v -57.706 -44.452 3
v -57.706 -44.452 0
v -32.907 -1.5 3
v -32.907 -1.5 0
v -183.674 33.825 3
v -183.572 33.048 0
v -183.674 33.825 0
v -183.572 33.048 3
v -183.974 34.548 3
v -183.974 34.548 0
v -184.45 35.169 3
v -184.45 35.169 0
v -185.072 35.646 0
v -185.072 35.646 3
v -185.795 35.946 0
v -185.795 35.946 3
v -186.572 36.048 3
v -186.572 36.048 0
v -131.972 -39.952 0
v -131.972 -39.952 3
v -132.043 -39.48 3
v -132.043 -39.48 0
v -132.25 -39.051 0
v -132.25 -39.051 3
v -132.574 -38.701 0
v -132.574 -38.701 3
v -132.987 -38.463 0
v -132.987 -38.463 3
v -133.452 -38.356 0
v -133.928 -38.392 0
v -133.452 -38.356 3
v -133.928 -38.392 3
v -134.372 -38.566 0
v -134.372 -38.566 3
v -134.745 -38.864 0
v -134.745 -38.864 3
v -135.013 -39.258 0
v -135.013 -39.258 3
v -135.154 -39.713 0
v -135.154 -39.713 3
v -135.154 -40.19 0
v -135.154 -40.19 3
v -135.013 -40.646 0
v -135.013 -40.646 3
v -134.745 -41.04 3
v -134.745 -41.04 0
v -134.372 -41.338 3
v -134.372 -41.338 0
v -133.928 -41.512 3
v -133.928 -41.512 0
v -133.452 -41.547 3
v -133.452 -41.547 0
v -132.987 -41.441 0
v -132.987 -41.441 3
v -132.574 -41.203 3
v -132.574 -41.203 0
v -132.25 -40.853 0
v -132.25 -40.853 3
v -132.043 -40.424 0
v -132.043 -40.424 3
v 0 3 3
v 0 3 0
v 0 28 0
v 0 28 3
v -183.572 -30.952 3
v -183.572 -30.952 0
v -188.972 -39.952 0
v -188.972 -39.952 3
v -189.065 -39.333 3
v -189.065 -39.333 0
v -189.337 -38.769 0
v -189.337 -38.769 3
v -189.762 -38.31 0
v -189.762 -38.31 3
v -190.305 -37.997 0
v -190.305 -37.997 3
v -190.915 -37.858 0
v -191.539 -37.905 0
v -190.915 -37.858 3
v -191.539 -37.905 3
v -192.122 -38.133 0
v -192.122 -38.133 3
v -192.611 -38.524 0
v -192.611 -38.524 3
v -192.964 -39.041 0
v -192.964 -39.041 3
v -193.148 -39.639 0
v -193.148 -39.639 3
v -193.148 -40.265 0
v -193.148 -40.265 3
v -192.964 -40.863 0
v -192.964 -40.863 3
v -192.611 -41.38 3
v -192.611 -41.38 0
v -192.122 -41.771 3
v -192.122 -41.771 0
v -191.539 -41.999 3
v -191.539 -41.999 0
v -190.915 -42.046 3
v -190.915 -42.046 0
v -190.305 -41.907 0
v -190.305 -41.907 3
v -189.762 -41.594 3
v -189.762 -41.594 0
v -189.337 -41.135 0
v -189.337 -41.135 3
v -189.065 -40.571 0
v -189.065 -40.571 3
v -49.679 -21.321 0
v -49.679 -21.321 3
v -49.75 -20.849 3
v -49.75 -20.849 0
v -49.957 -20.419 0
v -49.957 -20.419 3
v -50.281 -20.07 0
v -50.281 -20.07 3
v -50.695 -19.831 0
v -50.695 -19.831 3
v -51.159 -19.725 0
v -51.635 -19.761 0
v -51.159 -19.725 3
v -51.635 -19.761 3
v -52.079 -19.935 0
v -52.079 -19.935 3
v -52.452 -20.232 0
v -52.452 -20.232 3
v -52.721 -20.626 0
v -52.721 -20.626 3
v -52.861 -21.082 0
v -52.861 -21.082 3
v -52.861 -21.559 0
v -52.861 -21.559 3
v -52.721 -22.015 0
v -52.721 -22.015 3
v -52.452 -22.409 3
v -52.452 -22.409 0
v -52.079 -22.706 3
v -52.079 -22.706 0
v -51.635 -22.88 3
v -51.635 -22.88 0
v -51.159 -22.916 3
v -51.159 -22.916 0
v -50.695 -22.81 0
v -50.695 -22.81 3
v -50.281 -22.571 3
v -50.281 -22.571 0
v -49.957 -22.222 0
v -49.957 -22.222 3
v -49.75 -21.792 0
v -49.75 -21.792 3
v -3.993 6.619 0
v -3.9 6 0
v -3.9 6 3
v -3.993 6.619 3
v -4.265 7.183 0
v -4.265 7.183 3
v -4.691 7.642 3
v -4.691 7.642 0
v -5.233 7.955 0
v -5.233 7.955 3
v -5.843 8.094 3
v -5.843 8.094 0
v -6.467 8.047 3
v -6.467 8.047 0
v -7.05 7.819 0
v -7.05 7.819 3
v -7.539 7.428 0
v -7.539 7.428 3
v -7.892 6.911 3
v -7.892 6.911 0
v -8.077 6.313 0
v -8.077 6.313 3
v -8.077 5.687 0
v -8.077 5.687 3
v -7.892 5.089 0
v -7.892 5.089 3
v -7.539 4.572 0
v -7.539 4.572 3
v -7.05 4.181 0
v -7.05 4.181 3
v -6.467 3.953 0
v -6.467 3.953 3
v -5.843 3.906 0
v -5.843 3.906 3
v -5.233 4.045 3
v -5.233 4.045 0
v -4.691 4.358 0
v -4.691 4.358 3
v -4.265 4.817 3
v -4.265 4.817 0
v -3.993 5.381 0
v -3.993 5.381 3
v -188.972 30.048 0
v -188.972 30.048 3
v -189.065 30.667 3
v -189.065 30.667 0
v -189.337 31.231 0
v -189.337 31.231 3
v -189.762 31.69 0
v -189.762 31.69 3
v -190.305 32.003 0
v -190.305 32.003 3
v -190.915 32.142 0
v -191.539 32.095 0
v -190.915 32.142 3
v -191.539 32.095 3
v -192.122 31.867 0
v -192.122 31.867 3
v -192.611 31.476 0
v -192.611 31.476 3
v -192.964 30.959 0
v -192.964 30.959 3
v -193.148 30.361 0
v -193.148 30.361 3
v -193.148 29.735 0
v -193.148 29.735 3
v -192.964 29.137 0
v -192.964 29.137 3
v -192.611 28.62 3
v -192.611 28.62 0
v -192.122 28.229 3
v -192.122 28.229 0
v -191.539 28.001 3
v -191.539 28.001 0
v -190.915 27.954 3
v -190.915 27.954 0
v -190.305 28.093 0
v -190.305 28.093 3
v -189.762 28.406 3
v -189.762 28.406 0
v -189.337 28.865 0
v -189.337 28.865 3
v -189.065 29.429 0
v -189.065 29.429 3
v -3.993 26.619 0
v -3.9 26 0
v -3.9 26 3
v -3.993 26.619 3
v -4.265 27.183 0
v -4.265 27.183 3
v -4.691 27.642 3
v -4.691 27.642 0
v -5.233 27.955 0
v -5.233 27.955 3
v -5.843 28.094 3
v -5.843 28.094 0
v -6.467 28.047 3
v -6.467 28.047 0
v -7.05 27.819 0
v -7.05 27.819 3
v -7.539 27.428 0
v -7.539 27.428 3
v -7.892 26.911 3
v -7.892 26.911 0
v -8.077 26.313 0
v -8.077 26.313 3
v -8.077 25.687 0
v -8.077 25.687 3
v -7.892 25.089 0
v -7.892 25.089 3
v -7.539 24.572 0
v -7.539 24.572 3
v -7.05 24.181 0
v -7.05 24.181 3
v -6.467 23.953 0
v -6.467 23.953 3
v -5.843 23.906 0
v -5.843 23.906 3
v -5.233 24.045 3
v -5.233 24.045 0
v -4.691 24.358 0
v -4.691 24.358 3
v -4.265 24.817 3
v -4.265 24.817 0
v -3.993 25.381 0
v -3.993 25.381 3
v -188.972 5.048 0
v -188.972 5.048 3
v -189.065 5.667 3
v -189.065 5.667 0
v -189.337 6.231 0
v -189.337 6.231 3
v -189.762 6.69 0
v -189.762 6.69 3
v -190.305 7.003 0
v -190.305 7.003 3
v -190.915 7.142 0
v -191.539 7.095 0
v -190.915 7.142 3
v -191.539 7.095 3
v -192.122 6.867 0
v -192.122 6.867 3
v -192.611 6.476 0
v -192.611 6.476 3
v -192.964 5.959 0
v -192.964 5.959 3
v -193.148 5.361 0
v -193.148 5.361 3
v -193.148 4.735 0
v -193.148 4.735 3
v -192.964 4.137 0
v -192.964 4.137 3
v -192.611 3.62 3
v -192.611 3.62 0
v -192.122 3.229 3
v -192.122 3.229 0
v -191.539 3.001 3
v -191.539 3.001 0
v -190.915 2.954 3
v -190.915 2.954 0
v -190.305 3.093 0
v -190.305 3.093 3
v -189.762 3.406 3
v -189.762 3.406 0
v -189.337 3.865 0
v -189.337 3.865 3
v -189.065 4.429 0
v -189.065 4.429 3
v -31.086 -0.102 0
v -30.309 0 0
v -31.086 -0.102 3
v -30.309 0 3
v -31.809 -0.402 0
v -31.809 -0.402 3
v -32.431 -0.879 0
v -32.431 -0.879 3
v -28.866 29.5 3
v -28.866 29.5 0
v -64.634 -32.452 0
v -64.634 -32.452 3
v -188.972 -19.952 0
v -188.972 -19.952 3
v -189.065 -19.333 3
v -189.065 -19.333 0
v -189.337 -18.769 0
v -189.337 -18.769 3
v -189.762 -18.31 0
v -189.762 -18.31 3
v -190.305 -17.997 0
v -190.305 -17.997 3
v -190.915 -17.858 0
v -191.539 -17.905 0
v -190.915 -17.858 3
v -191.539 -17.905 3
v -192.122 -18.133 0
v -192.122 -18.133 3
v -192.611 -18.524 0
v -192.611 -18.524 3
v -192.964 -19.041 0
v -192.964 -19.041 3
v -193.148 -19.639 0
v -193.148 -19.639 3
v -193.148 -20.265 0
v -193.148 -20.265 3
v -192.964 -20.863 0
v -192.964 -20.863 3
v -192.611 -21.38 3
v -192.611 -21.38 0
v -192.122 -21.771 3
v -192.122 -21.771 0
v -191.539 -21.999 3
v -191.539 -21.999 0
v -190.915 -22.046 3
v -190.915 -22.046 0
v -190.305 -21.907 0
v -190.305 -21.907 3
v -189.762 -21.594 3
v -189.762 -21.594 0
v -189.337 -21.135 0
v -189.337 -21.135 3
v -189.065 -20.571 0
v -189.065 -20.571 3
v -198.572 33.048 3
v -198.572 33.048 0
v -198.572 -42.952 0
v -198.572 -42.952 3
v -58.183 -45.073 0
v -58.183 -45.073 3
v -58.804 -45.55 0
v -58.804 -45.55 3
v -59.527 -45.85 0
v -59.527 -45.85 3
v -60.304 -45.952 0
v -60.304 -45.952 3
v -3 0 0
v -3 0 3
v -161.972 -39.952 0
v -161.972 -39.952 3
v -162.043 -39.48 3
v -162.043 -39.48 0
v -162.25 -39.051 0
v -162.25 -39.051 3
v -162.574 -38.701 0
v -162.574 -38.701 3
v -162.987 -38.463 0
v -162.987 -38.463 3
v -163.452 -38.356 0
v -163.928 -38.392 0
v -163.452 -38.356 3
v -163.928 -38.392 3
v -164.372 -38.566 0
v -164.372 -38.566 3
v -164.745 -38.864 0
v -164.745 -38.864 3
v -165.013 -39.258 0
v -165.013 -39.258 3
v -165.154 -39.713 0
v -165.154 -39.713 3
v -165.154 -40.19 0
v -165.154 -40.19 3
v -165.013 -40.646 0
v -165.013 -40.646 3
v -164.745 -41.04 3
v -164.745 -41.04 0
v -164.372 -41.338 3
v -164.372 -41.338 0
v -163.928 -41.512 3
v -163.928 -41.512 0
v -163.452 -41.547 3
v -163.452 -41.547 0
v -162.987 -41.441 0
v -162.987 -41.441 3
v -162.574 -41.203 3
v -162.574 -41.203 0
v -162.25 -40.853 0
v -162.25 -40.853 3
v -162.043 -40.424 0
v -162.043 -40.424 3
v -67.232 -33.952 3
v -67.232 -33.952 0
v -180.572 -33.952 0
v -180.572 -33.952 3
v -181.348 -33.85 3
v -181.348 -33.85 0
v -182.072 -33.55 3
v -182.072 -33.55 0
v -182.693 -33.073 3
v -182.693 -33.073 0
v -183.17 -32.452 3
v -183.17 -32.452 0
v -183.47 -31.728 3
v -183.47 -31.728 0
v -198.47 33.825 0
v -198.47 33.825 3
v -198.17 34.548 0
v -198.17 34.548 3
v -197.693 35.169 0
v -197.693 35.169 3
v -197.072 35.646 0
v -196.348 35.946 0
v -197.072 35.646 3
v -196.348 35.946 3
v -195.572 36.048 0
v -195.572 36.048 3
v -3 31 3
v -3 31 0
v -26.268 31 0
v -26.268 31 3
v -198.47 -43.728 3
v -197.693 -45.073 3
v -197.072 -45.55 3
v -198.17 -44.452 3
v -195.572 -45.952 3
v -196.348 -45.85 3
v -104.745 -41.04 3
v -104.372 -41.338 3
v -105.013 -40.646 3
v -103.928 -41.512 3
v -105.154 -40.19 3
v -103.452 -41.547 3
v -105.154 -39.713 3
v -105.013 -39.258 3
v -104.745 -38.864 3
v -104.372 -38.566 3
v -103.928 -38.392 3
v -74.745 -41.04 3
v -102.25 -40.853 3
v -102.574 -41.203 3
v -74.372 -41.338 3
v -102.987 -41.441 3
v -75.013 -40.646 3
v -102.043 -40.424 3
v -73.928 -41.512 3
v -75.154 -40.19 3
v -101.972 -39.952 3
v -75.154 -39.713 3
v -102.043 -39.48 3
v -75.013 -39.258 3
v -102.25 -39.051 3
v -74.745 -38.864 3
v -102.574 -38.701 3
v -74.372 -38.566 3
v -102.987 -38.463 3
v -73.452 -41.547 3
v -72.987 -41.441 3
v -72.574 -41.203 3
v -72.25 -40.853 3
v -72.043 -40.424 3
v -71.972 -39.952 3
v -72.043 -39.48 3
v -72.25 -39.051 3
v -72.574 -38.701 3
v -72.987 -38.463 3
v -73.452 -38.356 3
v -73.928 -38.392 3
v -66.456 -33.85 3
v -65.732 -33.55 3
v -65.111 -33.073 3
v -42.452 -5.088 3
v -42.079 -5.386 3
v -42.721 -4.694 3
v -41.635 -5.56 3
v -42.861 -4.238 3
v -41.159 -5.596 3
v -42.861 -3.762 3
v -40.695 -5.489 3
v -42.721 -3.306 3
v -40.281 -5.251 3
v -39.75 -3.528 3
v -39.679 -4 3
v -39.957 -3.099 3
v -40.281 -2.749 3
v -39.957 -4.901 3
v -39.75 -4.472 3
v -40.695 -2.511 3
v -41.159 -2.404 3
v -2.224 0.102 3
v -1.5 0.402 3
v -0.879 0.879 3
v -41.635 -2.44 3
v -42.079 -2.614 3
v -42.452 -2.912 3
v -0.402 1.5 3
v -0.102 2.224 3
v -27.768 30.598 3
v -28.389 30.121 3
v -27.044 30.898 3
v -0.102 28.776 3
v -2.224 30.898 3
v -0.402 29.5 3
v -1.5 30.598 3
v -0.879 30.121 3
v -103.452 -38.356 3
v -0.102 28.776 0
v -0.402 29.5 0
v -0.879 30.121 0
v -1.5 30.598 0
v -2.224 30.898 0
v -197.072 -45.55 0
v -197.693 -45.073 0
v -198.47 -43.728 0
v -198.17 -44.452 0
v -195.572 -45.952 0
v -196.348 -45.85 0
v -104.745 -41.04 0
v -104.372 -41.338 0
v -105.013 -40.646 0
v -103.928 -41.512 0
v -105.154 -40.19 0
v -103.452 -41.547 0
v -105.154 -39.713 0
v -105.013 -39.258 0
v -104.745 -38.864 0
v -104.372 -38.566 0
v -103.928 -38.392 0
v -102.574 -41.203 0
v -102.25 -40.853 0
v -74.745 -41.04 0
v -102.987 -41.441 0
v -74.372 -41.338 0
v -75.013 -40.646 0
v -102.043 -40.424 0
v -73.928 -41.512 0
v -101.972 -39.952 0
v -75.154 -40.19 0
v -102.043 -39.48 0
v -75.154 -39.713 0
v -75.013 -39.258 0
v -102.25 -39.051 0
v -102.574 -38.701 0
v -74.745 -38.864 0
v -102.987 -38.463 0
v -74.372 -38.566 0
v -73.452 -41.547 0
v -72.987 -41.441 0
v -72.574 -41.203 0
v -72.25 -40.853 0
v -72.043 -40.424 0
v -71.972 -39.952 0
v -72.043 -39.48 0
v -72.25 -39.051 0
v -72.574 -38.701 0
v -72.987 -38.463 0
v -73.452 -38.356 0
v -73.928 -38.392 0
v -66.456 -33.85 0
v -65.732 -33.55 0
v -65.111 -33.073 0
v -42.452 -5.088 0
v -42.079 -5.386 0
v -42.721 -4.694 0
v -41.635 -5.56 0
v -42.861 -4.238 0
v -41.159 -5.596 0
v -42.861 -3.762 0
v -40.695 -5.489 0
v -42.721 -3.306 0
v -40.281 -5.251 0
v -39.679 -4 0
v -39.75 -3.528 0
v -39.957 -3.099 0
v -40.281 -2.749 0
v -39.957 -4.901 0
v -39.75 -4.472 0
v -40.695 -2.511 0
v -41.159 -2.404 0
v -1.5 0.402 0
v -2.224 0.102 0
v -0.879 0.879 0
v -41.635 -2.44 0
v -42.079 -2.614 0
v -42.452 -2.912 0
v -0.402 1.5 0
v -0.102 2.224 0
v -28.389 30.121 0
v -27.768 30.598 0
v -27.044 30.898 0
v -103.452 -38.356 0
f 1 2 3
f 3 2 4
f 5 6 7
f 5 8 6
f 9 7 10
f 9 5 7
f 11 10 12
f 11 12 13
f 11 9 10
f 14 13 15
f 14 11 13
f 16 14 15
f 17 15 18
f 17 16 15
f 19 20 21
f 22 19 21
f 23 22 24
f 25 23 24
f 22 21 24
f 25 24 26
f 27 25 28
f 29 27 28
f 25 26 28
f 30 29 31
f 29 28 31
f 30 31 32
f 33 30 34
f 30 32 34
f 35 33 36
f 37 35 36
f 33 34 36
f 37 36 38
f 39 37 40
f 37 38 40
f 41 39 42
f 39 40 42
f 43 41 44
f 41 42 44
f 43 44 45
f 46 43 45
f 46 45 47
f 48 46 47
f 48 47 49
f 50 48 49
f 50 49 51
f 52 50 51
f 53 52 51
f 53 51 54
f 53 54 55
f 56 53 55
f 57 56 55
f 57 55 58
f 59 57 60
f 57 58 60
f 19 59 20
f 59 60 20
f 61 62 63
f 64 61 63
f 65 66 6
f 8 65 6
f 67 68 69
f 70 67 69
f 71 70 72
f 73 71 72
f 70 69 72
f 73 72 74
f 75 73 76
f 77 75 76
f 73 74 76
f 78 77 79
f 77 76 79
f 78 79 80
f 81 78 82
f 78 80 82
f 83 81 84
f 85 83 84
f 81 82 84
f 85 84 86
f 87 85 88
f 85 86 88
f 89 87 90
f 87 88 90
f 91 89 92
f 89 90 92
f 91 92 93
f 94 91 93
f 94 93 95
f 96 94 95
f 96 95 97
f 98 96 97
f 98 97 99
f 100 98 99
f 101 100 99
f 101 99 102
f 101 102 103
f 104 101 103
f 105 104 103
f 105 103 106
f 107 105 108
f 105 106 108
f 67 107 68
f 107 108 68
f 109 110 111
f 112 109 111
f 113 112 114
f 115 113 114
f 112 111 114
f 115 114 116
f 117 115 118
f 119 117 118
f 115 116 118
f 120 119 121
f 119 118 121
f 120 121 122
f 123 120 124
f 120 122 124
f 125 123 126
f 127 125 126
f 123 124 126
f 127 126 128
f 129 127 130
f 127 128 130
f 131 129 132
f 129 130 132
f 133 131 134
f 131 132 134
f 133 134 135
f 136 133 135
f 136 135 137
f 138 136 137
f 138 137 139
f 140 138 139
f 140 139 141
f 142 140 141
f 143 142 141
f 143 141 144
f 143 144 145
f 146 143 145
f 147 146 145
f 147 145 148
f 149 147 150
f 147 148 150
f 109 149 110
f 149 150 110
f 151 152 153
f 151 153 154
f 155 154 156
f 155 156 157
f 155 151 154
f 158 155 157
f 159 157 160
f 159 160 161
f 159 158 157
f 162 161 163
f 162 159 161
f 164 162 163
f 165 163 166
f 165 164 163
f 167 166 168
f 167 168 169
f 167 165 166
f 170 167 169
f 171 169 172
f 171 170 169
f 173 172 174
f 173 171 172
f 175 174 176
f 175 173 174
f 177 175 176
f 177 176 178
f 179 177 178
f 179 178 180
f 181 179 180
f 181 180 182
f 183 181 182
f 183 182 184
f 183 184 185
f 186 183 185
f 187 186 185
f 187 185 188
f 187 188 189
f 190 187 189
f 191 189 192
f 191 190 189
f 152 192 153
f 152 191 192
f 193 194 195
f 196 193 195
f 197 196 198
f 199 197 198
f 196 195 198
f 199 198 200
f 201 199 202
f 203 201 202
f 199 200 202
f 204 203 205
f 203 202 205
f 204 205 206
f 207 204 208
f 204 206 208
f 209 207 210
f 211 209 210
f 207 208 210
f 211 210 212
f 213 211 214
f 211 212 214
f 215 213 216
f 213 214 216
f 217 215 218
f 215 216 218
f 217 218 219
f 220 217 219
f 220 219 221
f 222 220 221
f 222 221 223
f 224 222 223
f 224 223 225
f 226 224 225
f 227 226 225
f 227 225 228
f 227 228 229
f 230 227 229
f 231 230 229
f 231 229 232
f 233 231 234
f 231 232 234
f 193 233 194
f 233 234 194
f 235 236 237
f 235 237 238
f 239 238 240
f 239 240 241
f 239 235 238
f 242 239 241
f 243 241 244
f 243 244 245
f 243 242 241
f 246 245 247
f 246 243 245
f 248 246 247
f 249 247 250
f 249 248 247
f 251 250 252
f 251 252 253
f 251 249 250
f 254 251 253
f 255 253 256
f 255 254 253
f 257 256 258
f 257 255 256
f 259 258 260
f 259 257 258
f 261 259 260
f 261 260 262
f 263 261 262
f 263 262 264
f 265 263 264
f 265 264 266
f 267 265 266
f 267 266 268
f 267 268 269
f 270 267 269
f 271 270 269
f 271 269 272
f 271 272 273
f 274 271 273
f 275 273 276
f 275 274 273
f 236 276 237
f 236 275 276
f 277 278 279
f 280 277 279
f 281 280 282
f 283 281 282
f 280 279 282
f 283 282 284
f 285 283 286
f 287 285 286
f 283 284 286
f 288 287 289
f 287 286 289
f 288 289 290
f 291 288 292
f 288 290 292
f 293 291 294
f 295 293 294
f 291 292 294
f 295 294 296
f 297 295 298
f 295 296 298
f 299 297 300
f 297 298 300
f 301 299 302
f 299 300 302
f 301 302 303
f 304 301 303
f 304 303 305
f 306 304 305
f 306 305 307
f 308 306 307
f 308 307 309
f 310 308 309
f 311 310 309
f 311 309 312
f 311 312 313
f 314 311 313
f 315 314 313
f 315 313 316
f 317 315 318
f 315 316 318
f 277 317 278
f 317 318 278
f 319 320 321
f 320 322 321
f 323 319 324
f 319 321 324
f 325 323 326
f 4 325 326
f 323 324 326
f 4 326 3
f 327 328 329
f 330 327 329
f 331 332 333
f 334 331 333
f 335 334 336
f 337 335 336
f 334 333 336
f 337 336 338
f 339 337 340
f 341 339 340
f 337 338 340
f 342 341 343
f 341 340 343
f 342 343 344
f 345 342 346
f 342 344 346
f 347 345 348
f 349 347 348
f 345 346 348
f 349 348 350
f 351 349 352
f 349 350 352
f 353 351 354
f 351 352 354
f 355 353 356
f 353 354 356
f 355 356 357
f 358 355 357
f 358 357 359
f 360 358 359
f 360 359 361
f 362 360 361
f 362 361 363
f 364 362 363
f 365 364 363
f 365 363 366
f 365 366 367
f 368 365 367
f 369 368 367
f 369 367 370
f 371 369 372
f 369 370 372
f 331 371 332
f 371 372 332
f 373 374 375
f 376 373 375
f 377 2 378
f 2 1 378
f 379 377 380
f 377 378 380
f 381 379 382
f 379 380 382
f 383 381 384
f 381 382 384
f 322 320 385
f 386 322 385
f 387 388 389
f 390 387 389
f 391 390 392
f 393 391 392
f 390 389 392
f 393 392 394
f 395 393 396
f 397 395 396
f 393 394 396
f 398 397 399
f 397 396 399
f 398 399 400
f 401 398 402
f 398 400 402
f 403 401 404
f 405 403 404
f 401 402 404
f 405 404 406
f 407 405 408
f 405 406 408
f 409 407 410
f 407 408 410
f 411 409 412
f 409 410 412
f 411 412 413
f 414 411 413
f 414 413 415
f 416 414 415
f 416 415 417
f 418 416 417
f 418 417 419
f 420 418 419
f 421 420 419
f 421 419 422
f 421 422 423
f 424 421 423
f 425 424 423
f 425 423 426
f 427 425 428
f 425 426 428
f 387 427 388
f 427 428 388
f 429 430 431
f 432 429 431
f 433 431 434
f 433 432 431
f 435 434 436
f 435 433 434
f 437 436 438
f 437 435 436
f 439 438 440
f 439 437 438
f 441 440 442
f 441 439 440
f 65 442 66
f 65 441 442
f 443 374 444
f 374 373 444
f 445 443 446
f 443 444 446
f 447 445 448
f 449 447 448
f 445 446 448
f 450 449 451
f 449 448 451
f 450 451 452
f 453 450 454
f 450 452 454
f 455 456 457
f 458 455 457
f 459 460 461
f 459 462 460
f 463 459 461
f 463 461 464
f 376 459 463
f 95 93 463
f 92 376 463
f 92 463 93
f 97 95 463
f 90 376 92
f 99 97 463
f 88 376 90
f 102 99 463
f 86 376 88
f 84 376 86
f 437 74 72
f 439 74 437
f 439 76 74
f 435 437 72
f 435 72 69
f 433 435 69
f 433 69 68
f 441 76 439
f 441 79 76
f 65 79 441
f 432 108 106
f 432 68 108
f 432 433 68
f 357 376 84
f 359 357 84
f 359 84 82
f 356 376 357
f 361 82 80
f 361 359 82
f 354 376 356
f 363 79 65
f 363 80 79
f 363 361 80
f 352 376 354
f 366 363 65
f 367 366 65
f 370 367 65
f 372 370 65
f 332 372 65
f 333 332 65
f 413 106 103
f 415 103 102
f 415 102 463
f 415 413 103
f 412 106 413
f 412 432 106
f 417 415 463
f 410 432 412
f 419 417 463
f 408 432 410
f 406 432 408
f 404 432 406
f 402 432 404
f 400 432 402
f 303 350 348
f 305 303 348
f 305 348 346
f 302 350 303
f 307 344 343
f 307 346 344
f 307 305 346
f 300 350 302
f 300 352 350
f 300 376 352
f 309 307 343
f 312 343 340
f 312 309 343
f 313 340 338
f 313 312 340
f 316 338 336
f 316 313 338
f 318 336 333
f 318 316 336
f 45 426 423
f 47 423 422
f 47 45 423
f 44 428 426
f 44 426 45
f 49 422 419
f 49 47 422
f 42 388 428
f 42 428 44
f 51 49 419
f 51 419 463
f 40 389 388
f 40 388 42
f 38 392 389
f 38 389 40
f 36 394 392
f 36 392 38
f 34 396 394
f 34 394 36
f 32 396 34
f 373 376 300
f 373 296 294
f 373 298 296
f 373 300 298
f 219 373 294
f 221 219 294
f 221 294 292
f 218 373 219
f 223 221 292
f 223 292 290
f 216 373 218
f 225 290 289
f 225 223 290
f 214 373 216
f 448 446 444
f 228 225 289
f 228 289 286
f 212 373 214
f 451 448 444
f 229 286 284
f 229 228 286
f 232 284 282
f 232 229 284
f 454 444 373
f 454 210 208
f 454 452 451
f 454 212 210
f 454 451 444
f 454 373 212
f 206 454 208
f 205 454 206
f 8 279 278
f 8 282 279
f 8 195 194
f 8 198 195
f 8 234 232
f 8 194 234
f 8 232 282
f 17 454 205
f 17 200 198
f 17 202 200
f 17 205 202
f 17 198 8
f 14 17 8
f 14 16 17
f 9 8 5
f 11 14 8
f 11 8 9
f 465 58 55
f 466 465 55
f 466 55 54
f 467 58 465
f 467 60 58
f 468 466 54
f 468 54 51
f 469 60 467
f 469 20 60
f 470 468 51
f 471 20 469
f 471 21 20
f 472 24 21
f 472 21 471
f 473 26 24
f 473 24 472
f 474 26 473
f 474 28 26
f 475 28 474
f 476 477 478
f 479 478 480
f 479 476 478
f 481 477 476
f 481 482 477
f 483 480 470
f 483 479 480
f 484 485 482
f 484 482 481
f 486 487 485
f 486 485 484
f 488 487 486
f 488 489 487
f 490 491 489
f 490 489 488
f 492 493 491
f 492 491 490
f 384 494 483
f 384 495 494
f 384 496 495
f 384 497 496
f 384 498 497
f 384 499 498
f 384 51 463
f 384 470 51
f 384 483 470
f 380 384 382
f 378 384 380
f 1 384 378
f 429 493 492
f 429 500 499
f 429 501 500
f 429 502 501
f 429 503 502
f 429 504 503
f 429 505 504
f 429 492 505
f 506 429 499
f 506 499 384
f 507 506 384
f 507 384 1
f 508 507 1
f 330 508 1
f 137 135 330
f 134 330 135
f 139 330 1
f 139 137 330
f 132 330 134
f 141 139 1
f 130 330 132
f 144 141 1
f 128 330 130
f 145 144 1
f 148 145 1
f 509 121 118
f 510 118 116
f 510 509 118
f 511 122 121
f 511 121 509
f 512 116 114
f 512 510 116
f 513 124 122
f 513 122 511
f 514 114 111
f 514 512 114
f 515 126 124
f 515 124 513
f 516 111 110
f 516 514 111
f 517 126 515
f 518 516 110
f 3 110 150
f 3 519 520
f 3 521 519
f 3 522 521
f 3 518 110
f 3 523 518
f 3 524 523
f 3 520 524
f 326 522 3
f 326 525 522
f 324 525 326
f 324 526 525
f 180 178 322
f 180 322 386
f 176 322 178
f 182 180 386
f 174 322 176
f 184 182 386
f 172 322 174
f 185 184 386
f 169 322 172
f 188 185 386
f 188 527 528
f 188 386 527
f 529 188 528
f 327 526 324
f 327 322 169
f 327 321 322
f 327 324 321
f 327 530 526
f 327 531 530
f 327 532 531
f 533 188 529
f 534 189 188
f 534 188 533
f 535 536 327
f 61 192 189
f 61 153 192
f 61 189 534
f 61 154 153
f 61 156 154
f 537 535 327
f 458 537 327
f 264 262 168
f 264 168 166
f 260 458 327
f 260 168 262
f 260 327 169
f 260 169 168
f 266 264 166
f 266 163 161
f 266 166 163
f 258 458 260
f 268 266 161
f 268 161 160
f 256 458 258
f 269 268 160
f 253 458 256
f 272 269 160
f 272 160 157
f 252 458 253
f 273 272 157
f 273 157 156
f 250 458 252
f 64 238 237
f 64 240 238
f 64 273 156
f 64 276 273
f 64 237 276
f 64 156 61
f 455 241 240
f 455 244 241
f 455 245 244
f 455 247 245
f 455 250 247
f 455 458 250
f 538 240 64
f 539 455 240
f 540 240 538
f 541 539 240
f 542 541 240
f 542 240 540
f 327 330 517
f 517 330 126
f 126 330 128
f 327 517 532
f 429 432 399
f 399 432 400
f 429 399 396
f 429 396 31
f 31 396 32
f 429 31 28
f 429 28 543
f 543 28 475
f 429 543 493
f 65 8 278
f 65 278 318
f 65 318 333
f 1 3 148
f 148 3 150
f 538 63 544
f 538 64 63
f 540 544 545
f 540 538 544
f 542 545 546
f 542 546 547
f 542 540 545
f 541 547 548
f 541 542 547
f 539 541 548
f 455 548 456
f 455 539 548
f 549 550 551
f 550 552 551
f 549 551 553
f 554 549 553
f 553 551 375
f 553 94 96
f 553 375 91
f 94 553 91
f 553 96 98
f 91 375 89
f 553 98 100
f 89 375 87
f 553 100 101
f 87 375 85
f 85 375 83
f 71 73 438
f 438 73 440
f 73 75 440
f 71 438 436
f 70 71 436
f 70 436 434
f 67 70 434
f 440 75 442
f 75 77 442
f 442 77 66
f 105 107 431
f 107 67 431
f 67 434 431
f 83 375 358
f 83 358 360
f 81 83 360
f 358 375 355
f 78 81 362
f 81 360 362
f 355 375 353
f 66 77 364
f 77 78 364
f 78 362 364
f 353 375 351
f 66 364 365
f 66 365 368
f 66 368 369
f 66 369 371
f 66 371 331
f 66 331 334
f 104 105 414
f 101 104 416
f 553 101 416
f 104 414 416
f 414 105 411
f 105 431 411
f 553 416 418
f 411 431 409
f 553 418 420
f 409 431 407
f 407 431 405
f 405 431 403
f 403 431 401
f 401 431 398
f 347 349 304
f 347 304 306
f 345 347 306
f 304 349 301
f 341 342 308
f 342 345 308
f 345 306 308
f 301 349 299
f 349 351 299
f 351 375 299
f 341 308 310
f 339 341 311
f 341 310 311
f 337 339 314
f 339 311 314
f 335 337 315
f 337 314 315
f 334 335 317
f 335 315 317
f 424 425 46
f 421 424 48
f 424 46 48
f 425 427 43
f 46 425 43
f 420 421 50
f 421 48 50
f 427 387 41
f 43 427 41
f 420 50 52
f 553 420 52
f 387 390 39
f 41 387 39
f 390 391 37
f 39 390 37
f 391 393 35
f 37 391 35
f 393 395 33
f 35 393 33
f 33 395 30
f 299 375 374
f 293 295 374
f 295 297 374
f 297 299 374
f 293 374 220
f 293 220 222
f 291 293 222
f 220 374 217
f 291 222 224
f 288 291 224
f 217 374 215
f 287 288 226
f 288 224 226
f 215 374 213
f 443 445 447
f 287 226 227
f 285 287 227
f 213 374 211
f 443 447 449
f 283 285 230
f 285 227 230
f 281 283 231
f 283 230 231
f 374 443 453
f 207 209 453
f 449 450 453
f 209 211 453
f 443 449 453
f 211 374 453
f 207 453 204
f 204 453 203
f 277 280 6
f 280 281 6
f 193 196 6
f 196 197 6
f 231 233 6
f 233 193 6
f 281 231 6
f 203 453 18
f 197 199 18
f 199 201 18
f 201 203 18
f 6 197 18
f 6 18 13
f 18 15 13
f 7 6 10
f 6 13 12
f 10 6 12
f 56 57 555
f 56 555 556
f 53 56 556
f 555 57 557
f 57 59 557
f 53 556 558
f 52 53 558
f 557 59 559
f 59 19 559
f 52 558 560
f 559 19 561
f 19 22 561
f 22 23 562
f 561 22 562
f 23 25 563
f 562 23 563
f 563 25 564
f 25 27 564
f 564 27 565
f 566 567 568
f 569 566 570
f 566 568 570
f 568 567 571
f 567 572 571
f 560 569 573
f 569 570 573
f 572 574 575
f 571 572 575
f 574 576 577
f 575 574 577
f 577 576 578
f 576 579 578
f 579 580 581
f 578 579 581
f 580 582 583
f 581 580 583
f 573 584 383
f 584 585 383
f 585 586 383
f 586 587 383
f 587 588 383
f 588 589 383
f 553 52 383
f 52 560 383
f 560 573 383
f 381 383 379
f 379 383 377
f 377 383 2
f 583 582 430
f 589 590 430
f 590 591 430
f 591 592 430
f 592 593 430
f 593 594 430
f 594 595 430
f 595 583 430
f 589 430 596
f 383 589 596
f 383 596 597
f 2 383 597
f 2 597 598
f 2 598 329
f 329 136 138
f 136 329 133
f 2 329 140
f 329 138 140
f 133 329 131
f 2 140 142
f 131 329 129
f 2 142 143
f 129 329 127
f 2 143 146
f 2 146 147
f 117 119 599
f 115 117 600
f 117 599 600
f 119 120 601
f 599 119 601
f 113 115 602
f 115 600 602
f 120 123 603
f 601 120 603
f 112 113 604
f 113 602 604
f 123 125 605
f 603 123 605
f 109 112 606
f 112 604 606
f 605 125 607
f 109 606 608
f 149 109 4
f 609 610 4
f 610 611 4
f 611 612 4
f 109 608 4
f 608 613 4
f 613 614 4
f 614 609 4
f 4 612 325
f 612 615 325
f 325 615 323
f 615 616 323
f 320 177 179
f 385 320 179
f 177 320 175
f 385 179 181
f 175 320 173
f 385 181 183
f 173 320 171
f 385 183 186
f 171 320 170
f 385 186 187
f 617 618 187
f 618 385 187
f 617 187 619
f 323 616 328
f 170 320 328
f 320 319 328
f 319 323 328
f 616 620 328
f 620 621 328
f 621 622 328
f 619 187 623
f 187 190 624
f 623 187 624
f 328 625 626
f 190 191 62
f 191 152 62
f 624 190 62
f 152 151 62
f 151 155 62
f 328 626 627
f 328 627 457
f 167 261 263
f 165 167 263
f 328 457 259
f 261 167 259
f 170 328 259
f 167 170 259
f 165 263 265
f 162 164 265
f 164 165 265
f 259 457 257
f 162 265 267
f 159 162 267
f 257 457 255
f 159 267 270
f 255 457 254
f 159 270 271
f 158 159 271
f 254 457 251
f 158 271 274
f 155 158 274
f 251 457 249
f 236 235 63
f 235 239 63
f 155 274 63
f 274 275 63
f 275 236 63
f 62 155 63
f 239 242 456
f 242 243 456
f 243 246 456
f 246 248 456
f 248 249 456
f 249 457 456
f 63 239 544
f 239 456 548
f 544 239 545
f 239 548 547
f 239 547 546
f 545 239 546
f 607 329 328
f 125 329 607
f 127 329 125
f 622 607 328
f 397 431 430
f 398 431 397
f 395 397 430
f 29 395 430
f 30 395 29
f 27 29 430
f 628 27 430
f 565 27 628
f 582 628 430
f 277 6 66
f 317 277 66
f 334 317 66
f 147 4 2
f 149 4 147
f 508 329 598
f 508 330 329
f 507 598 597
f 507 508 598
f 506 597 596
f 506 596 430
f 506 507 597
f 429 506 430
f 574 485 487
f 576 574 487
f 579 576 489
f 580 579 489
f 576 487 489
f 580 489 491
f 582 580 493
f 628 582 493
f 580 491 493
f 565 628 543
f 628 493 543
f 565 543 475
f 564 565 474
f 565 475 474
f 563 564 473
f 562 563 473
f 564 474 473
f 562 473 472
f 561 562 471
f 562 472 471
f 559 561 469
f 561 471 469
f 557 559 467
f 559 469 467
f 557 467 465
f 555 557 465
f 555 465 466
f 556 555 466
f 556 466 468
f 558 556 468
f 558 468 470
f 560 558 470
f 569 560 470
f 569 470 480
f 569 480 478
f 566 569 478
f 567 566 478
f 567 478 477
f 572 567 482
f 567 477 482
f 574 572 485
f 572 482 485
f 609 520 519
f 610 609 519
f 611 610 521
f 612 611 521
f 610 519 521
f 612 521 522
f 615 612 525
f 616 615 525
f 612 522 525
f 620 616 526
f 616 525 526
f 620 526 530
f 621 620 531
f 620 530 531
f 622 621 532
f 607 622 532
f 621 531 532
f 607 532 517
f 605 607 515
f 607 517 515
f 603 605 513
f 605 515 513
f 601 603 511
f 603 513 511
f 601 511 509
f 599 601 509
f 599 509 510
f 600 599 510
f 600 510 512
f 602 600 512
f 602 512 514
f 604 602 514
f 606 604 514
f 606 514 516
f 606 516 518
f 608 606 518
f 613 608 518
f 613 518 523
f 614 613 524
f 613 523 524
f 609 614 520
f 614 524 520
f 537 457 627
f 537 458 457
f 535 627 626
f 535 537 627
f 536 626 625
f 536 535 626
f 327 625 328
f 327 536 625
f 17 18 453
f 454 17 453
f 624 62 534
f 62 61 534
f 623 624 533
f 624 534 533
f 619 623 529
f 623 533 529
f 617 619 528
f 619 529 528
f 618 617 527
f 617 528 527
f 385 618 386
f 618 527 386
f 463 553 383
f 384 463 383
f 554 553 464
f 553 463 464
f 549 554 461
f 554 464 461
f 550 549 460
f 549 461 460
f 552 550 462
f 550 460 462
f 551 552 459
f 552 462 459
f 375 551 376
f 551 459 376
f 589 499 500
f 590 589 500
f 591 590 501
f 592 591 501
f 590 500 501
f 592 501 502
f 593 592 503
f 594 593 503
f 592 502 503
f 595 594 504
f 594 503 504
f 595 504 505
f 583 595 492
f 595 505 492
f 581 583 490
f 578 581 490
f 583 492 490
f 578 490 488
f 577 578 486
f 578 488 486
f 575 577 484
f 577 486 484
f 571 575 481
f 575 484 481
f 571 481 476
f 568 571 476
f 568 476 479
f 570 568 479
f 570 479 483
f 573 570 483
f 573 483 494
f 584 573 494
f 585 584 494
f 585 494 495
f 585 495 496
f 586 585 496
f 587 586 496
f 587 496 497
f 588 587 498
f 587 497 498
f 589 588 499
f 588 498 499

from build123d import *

# Parameters (mm, degrees)
SKETCH_1_R          = 2.1
EXTRUDE_1_DEPTH     = 3
FILLET_2_R          = 3
SKETCH_3_R          = 1.6
SKETCH_3_R_2        = 2.1
CUT_EXTRUDE_2_DEPTH = 3


with BuildPart() as part:
    # 草图1 → 凸台-拉伸1 (new body)
    with BuildSketch(Plane.XY):
        Polygon((0, 0), (0, 31), (-28, 31), (-65.5, -33.951905284), (-183.57179677, -33.951905284), (-183.57179677, 36.048094716), (-198.57179677, 36.048094716), (-198.57179677, -45.951905284), (-58.57179677, -45.951905284), (-32.041451884, 0), align=None)
        with Locations((-6, 26)):
            Circle(SKETCH_1_R, mode=Mode.SUBTRACT)
        with Locations((-6, 6)):
            Circle(SKETCH_1_R, mode=Mode.SUBTRACT)
    extrude(amount=EXTRUDE_1_DEPTH)

    # 圆角2
    fillet_2_edges = [part.edges().sort_by_distance(p)[0] for p in [
        (-32.041451884, 0, 1.5),
        (-58.57179677, -45.951905284, 1.5),
        (-198.57179677, -45.951905284, 1.5),
        (-198.57179677, 36.048094716, 1.5),
        (-183.57179677, 36.048094716, 1.5),
        (-183.57179677, -33.951905284, 1.5),
        (-65.5, -33.951905284, 1.5),
        (-28, 31, 1.5),
        (0, 31, 1.5),
        (0, 0, 1.5),
    ]]
    fillet(fillet_2_edges, radius=FILLET_2_R)

    # 草图3 → 切除-拉伸2 (cut)
    with BuildSketch(Plane.XY.offset(3)):
        with Locations((-41.279056191, -4)):
            Circle(SKETCH_3_R)
        with Locations((-51.279056191, -21.320508076)):
            Circle(SKETCH_3_R)
        with Locations((-73.57179677, -39.951905284)):
            Circle(SKETCH_3_R)
        with Locations((-103.57179677, -39.951905284)):
            Circle(SKETCH_3_R)
        with Locations((-133.57179677, -39.951905284)):
            Circle(SKETCH_3_R)
        with Locations((-191.07179677, -19.951905284)):
            Circle(SKETCH_3_R_2)
        with Locations((-191.07179677, 5.048094716)):
            Circle(SKETCH_3_R_2)
        with Locations((-191.07179677, 30.048094716)):
            Circle(SKETCH_3_R_2)
        with Locations((-191.07179677, -39.951905284)):
            Circle(SKETCH_3_R_2)
        with Locations((-163.57179677, -39.951905284)):
            Circle(SKETCH_3_R)
    extrude(amount=-CUT_EXTRUDE_2_DEPTH, mode=Mode.SUBTRACT)


solid = part.part
